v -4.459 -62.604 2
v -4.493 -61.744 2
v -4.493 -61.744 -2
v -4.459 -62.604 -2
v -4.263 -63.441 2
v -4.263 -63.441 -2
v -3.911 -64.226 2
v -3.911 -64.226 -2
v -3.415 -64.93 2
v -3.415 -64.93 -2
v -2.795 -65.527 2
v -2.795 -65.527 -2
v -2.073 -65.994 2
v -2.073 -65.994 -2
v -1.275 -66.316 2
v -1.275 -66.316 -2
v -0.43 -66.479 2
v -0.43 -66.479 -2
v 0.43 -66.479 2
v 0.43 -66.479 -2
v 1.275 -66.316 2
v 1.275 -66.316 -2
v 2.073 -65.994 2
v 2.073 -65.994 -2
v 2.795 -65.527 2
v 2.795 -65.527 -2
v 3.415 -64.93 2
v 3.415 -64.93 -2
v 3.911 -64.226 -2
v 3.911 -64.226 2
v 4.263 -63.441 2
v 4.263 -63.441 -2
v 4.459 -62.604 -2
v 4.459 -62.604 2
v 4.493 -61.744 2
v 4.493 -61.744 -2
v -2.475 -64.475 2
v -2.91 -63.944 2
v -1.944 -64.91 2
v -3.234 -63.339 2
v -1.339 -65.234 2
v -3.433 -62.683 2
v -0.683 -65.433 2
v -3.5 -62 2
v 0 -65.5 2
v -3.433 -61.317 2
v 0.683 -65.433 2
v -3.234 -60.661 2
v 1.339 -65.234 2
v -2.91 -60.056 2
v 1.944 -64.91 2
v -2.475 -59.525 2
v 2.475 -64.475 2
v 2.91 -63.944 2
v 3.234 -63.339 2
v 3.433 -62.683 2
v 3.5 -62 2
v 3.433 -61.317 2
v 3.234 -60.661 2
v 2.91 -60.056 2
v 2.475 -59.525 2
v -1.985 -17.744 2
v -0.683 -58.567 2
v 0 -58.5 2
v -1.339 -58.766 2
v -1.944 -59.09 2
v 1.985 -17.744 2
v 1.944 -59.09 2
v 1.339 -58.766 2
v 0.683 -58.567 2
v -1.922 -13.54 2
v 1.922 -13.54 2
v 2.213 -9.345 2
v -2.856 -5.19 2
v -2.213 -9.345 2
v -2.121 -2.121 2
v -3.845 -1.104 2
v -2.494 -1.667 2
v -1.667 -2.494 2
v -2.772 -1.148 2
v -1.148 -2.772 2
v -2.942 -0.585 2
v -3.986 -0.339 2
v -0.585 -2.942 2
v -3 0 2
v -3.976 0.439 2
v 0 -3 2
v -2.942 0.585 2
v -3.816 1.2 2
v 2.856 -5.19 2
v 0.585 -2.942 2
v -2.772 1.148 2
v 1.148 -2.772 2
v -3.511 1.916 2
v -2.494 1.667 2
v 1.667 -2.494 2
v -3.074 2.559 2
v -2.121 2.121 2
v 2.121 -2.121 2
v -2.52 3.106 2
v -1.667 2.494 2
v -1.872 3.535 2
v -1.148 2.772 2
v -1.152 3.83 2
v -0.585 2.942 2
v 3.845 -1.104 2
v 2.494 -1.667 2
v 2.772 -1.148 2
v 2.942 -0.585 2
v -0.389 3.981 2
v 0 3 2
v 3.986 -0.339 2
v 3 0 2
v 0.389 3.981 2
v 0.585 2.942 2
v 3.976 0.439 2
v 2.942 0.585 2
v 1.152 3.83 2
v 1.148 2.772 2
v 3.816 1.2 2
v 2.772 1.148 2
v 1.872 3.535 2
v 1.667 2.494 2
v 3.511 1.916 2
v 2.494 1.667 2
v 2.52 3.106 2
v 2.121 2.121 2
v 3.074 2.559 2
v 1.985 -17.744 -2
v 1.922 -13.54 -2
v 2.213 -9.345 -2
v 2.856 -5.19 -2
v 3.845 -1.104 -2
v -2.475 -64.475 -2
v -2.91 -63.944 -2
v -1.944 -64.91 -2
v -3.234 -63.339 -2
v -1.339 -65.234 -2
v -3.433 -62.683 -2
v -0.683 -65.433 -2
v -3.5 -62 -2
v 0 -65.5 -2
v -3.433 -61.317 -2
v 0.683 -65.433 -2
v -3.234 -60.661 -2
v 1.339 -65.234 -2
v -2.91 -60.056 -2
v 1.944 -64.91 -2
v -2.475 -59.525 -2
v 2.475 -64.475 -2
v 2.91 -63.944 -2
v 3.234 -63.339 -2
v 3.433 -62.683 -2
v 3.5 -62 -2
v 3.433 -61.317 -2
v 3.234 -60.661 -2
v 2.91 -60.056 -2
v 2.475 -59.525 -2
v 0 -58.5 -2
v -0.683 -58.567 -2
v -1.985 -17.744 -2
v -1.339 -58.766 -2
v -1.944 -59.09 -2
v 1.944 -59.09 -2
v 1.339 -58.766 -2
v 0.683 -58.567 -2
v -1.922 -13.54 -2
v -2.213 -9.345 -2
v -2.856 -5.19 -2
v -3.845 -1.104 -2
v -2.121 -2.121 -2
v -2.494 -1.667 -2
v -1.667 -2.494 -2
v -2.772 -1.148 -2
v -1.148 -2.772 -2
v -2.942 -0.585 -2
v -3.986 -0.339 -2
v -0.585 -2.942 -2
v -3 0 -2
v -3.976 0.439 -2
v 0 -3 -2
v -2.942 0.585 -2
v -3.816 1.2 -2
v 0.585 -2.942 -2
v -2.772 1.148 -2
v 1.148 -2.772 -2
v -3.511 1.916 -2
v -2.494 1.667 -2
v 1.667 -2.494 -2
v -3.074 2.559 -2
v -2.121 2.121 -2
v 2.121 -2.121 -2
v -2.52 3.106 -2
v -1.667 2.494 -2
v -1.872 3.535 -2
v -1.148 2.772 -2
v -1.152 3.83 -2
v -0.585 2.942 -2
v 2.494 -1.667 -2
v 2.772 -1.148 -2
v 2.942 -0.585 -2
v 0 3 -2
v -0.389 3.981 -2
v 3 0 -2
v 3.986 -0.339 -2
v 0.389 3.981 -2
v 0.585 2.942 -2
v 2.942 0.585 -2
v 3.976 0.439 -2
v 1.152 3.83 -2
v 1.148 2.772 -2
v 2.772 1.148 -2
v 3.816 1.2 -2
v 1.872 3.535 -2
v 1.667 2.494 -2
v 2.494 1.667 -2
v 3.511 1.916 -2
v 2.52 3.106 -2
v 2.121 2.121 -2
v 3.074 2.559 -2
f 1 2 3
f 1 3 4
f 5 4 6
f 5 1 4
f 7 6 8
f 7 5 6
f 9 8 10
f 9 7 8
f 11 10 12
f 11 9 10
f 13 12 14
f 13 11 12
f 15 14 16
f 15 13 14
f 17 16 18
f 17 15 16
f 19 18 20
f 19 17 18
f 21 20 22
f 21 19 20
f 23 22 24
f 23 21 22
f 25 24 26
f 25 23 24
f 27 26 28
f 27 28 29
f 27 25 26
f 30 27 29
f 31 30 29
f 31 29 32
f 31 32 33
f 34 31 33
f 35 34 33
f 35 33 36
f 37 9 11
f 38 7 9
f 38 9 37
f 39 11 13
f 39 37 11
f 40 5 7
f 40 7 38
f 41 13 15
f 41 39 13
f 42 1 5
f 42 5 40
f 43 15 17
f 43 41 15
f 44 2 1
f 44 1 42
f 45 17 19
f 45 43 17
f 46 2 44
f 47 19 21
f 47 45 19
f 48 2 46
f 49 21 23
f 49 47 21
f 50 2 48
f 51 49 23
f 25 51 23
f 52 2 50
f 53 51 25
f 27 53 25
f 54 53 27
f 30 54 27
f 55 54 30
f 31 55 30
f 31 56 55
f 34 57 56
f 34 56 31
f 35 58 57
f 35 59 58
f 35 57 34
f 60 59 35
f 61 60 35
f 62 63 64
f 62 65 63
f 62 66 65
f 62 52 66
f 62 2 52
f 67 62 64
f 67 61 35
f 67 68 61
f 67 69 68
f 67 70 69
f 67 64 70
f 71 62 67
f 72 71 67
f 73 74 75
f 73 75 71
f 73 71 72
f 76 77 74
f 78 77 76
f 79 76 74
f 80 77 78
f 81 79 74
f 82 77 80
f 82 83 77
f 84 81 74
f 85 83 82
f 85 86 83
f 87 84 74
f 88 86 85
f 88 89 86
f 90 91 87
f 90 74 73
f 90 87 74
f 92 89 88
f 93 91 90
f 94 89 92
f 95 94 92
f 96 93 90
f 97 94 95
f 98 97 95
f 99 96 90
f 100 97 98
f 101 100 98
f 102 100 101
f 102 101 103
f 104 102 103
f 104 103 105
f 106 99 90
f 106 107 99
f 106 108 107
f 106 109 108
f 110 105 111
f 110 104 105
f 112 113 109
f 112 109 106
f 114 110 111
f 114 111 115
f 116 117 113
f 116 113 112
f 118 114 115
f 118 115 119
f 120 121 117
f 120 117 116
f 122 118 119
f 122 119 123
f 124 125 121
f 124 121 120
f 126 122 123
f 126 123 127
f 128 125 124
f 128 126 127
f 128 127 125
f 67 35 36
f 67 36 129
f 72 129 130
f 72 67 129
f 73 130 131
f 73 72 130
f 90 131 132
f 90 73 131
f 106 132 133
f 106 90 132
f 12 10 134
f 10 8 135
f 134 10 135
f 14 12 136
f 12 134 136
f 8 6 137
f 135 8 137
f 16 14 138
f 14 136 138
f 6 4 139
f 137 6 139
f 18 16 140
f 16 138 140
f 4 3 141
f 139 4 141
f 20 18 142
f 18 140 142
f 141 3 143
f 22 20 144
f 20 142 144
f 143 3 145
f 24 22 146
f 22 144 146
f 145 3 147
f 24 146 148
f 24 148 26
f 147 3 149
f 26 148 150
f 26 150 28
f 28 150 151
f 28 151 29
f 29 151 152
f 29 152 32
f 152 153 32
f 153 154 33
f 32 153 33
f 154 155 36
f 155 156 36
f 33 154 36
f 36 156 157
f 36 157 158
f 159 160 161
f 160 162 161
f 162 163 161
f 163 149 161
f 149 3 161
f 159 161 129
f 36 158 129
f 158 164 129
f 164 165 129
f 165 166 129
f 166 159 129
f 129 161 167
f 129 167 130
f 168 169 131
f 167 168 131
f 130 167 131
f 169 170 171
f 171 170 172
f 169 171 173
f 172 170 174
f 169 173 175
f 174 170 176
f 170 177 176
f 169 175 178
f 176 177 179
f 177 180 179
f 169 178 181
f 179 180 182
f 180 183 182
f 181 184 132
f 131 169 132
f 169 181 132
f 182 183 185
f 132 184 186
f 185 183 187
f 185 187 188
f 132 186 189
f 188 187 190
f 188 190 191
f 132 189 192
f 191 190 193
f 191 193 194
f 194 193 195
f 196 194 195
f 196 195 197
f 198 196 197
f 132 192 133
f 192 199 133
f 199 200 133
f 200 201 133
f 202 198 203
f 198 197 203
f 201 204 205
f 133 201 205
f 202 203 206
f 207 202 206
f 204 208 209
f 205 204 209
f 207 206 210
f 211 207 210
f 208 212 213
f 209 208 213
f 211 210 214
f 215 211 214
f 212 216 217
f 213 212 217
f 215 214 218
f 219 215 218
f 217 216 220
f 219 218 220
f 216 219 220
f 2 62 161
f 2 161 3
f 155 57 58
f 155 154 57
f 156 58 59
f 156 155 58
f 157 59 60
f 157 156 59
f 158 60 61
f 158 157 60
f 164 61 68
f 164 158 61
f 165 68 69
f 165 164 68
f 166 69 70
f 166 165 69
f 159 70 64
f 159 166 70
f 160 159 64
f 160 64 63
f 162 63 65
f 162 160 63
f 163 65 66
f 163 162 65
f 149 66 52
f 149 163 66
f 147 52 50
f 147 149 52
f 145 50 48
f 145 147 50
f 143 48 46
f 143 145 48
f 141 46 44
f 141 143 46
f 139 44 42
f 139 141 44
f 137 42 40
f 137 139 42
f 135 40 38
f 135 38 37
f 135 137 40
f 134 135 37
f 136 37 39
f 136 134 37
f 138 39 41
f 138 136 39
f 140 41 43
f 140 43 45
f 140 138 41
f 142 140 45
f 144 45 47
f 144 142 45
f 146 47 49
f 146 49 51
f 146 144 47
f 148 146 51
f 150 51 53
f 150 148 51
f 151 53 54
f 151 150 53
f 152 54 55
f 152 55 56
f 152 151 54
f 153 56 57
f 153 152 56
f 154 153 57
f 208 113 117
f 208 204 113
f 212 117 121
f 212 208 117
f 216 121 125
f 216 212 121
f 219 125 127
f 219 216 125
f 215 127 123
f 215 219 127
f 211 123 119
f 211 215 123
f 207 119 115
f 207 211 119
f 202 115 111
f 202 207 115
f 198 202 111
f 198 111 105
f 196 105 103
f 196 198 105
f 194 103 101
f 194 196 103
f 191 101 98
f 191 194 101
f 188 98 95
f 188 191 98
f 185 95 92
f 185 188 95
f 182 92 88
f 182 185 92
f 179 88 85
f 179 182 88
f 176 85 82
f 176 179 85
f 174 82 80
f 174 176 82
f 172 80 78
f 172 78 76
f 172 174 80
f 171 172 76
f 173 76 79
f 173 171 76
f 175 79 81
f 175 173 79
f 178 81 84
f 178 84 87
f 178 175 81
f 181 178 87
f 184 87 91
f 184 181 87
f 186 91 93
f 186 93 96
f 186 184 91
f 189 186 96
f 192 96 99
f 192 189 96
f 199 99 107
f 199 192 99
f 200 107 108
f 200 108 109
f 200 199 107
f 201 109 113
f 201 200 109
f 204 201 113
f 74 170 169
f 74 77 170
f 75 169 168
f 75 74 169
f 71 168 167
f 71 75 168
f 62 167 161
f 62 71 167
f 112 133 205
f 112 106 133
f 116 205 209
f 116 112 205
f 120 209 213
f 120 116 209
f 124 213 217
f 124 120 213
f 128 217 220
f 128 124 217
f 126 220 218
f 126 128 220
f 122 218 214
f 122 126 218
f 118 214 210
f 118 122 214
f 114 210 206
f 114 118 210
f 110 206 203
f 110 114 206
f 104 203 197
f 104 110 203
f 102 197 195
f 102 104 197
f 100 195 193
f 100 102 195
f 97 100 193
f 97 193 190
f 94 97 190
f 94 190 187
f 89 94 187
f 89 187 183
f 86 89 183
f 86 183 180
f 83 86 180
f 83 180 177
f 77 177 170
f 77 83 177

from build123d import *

# Parameters (mm, degrees)
SKETCH_1_R      = 3
SKETCH_1_R_2    = 3.5
EXTRUDE_1_DEPTH = 2


with BuildPart() as part:
    # 草图1 → 凸台-拉伸1 (new, symmetric)
    with BuildSketch(Plane.XY):
        with BuildLine():
            ThreePointArc((-3.844739387, -1.103620878), (-2.213352607, -9.345380488), (-1.984991162, -17.743944374))
            Line((-1.984991162, -17.743944374), (-4.492709151, -61.743944374))
            ThreePointArc((-4.492709151, -61.743944374), (0, -66.5), (4.492709151, -61.743944374))
            Line((4.492709151, -61.743944374), (1.984991162, -17.743944374))
            ThreePointArc((1.984991162, -17.743944374), (2.213352607, -9.345380488), (3.844739387, -1.103620878))
            ThreePointArc((3.844739387, -1.103620878), (0, 4), (-3.844739387, -1.103620878))
        make_face()
        Circle(SKETCH_1_R, mode=Mode.SUBTRACT)
        with Locations((0, -62)):
            Circle(SKETCH_1_R_2, mode=Mode.SUBTRACT)
    extrude(amount=EXTRUDE_1_DEPTH, both=True)


solid = part.part
